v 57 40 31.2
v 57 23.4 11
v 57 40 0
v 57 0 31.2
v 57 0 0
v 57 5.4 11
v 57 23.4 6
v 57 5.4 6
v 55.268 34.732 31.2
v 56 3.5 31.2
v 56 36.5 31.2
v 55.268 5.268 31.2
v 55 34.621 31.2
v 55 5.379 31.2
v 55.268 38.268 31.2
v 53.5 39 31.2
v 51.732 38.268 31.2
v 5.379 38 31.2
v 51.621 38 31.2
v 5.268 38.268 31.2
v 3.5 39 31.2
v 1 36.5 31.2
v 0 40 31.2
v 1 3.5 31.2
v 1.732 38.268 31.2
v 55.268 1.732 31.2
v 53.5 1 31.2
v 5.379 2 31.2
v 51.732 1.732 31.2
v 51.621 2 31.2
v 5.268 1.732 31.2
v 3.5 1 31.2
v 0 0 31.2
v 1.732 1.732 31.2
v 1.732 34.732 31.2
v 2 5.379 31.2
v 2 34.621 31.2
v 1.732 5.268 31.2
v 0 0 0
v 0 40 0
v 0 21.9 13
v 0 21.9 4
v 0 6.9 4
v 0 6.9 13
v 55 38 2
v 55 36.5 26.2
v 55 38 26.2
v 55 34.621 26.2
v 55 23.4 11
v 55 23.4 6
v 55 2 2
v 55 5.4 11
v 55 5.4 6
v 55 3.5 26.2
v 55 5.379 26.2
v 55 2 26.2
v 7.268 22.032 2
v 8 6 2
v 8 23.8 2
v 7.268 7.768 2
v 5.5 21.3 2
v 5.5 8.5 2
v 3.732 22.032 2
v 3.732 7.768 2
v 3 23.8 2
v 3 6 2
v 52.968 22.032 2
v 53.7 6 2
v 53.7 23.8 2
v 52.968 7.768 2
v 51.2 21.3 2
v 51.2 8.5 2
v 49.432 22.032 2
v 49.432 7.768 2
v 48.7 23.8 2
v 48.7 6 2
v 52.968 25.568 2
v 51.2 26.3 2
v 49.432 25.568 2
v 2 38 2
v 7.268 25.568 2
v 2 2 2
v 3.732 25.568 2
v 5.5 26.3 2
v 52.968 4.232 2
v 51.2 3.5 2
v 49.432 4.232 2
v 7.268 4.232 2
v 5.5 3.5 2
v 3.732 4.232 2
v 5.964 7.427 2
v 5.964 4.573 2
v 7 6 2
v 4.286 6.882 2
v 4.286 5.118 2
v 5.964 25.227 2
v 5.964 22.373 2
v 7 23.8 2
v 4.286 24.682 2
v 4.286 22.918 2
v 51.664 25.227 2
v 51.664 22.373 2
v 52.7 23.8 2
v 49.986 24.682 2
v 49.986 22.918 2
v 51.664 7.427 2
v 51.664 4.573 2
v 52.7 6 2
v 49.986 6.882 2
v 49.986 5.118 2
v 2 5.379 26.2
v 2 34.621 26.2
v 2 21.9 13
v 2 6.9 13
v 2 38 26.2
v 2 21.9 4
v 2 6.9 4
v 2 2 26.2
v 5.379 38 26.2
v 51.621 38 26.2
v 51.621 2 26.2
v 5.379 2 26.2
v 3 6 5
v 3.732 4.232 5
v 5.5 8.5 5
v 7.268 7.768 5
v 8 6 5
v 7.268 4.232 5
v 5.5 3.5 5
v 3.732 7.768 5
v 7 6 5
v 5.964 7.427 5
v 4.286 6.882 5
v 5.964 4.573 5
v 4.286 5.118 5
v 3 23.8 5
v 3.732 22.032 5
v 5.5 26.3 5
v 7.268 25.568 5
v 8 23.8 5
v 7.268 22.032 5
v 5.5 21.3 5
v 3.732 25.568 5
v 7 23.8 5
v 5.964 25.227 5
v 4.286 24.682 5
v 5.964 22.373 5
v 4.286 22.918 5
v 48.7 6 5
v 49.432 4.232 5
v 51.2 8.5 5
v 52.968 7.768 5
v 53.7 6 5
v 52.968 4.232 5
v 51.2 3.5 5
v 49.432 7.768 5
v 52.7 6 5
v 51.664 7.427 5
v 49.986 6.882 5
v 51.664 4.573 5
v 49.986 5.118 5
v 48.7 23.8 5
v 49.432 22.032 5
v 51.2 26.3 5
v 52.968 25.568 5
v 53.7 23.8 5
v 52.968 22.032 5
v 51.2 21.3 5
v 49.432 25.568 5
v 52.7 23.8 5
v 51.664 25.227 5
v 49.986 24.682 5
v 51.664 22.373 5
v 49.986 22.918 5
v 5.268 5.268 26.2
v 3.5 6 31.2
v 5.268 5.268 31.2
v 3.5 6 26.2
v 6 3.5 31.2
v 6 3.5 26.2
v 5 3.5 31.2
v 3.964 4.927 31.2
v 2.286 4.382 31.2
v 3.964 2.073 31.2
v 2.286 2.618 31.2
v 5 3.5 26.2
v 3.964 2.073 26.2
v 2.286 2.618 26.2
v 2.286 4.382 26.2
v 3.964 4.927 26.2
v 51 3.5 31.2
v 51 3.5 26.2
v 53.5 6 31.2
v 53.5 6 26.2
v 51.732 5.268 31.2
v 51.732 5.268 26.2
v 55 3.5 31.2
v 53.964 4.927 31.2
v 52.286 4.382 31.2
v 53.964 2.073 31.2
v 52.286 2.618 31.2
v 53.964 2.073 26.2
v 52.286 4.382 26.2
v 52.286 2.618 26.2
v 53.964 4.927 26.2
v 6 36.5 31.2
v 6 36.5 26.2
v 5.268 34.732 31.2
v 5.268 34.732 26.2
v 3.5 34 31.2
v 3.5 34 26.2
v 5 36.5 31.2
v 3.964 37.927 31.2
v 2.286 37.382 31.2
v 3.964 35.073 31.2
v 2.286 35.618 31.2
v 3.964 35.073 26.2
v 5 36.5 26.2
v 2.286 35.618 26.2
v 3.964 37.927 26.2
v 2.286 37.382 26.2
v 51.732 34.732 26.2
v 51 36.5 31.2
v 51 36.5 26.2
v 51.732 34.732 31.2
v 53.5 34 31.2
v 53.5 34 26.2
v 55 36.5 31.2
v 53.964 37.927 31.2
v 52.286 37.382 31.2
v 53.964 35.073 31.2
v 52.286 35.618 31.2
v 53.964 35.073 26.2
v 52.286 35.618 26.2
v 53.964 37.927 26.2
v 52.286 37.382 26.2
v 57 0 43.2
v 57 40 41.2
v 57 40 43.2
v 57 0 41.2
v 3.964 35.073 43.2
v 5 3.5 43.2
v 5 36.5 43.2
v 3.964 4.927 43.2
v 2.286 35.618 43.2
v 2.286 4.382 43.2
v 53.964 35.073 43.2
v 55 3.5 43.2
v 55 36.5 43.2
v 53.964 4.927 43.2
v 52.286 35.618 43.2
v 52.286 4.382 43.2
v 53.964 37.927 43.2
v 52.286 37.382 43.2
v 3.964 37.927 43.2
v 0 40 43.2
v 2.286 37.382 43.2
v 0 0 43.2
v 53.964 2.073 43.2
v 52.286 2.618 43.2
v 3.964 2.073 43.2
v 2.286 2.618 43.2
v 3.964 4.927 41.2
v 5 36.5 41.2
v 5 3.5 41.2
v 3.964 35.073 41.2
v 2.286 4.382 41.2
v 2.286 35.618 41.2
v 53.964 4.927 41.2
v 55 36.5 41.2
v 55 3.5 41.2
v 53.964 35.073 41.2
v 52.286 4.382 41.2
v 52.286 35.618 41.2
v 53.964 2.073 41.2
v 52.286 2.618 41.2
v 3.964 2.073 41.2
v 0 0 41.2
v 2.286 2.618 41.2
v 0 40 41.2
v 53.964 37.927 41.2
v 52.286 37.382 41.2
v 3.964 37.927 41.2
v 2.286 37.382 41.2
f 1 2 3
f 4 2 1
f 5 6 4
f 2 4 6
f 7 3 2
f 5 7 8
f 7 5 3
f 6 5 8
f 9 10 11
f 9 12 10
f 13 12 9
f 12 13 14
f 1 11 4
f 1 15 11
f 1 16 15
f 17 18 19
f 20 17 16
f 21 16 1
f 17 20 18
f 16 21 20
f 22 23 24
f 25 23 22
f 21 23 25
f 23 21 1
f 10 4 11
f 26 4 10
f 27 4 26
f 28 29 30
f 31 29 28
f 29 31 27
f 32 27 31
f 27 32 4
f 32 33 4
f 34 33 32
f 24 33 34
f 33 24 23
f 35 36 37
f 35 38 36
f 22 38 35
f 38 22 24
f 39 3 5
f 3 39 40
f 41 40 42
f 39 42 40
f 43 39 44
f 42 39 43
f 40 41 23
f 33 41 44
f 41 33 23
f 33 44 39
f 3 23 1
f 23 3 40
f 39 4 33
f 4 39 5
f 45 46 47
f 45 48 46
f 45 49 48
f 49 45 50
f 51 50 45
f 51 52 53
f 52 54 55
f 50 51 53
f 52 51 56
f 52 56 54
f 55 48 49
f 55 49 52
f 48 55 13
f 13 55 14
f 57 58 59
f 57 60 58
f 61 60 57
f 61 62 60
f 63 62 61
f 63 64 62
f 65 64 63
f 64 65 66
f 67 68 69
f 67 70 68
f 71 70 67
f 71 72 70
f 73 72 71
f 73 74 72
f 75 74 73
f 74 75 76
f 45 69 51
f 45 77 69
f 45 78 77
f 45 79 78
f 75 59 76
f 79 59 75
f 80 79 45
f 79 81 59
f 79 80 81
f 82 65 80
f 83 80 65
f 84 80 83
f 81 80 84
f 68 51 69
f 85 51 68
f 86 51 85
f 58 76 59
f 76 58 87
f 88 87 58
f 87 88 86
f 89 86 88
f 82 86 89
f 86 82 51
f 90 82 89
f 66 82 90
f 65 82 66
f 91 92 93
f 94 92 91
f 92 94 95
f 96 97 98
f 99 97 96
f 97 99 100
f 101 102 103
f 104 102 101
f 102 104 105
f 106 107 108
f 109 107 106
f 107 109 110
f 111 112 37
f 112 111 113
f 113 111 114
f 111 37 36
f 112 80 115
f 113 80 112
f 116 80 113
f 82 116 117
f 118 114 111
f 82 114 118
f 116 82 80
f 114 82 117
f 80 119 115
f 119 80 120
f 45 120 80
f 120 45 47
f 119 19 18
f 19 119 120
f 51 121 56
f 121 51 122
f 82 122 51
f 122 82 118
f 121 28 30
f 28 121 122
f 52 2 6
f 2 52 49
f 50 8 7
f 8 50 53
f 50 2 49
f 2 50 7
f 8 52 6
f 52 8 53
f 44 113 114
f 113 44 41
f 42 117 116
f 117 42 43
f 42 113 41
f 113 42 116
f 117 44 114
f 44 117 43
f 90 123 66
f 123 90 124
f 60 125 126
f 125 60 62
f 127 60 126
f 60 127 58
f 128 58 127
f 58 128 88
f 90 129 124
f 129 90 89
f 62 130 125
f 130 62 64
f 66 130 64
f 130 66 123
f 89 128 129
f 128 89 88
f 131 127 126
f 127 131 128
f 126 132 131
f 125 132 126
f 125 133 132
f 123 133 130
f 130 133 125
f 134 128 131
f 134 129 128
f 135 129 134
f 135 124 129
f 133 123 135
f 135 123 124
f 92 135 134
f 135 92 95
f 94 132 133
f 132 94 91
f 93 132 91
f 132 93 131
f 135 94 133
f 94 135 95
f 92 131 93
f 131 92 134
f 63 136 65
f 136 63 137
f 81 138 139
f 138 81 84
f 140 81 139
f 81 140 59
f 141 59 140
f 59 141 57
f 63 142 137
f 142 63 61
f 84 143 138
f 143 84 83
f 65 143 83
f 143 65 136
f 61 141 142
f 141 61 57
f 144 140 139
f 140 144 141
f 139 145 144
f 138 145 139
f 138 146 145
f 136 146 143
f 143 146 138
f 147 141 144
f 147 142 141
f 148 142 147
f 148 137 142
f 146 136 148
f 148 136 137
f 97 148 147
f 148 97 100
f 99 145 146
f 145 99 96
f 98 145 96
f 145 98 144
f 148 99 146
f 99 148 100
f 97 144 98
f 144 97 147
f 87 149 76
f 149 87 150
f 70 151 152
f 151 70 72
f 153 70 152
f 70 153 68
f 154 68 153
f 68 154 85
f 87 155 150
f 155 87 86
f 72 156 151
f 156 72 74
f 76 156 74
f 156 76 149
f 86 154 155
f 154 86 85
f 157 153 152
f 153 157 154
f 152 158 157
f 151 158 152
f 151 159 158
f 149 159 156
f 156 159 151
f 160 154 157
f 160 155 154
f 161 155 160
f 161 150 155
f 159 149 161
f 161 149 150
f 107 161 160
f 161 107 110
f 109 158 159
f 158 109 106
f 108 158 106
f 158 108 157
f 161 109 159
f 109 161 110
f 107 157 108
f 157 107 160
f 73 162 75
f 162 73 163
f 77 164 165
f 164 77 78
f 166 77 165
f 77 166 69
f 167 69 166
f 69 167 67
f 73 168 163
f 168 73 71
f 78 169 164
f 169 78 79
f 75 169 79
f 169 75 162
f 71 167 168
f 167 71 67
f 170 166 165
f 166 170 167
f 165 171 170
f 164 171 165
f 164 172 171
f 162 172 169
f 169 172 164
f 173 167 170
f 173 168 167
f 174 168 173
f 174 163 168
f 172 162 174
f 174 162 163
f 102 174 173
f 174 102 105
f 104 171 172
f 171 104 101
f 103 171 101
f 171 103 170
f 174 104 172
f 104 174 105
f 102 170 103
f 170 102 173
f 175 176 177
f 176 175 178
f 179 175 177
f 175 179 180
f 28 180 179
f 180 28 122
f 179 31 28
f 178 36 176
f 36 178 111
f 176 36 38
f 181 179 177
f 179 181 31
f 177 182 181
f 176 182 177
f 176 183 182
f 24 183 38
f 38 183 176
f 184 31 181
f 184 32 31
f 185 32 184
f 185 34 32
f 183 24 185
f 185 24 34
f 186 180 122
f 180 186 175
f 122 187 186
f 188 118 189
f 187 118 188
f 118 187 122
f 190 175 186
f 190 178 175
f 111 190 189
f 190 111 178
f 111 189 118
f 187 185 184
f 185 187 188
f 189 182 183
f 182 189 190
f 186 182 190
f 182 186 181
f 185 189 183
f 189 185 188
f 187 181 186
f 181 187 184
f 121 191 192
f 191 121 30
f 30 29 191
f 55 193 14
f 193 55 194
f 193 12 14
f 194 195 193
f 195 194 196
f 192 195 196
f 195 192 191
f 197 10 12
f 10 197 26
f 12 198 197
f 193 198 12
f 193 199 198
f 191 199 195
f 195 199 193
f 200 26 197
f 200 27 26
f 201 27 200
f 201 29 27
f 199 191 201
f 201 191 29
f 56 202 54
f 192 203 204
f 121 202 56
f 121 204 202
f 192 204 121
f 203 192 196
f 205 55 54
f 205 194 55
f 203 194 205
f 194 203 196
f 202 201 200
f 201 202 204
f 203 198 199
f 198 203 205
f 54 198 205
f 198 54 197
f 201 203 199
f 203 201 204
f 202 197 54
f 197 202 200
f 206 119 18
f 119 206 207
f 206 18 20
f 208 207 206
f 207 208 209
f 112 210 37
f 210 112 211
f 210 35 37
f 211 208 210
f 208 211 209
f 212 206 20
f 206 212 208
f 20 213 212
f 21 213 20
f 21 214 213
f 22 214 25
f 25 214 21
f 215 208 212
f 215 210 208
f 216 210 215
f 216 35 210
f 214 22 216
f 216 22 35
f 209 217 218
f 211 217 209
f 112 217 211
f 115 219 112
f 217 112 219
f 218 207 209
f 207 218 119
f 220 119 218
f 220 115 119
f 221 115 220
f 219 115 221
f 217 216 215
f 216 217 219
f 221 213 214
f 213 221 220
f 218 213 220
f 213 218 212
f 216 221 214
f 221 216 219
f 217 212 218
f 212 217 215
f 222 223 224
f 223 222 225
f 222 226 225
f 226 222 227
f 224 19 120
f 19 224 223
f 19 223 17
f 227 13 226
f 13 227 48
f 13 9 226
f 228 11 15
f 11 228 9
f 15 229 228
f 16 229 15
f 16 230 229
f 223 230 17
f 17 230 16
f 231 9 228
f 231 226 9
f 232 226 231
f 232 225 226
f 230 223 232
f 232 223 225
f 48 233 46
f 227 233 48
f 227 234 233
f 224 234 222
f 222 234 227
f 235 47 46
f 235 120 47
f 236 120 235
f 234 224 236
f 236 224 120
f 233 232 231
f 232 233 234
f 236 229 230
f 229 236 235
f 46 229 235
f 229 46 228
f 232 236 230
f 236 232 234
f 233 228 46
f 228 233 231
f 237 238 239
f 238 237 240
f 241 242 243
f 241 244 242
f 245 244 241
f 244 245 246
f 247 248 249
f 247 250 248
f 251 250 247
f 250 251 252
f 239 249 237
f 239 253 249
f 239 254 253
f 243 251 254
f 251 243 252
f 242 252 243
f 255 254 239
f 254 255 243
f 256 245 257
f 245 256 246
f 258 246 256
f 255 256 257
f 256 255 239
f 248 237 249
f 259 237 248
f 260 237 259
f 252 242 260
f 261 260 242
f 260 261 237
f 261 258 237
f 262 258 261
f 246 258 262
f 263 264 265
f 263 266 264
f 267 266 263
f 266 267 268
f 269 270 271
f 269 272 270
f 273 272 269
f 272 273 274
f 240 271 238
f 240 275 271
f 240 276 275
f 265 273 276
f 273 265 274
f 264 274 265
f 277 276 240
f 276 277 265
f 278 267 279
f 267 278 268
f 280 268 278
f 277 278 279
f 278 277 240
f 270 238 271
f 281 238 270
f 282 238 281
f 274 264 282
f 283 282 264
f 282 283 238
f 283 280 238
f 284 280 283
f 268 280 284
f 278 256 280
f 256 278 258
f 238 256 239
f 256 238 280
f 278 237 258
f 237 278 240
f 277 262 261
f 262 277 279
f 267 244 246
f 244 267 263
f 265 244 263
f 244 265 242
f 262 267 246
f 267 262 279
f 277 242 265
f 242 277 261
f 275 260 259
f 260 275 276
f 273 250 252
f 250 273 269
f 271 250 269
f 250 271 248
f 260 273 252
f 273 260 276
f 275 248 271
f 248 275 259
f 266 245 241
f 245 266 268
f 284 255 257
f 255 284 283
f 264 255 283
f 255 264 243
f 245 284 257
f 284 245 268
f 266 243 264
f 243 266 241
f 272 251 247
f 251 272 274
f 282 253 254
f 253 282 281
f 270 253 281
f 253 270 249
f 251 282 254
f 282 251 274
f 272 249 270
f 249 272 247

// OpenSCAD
PM_LENGTH = 51;
PM_WIDTH = 22.8;
PM_HEIGHT = 12.2;

BATTERY_LENGTH = 50;
BATTERY_WIDTH = 34;
BATTERY_HEIGHT = 10;

BOLT_DIAMETER = 3;

WALL_THICKNESS = 2;
TOLERANCE = 1;
BUFFER = 3;
BOX_HEIGHT = PM_HEIGHT + BATTERY_HEIGHT + BUFFER + (WALL_THICKNESS*2) + (TOLERANCE*2);

difference(){
    // main box 
    cube([PM_LENGTH+(WALL_THICKNESS*2)+(TOLERANCE*2),
        BATTERY_WIDTH+(WALL_THICKNESS*2)+(TOLERANCE*2),
        BOX_HEIGHT
    ]);

    // opening for board
    translate([WALL_THICKNESS,WALL_THICKNESS,WALL_THICKNESS]){
        // Combined components outline
        cube([PM_LENGTH+(TOLERANCE*2),
            BATTERY_WIDTH+(TOLERANCE*2),
            BOX_HEIGHT
        ]);
    }
    
    /*
    // mounting bolt openings
    translate([6,6,0]){
        cylinder(r=2/2,h=PM_HEIGHT*2);
    }
    translate([6,PM_WIDTH+(WALL_THICKNESS*2)+(TOLERANCE*2)-5,0]){
        cylinder(r=2/2,h=PM_HEIGHT*2);
    }
    translate([(PM_LENGTH+(WALL_THICKNESS*2)+(TOLERANCE*2))-5,6,0]){
        cylinder(r=2/2,h=PM_HEIGHT*2);
    }
    translate([(PM_LENGTH+(WALL_THICKNESS*2)+(TOLERANCE*2))-5,PM_WIDTH+(WALL_THICKNESS*2)+(TOLERANCE*2)-5,0]){
        cylinder(r=2/2,h=PM_HEIGHT*2);
    }
    */
    
    // opening for wires
    translate([(PM_LENGTH+(WALL_THICKNESS*2)+(TOLERANCE*2))-(WALL_THICKNESS*2),(PM_WIDTH+(WALL_THICKNESS*2)+(TOLERANCE*2))/2-(18/2),6]){
        cube([WALL_THICKNESS*3, 18,5]);
    }
    
    // opening for USB-C
    translate([-1,(PM_WIDTH+(WALL_THICKNESS*2)+(TOLERANCE*2))/2-(15/2),4]){
        cube([WALL_THICKNESS*3, 15,9]);
    }
    
    /*
    // DEBUG: slice it in half 
    translate([-1,-1,16]){
    //translate([-1,-1,-1]){
        cube([PM_LENGTH+(WALL_THICKNESS*2)+(TOLERANCE*2)+2,PM_WIDTH+(WALL_THICKNESS*2)+(TOLERANCE*2)+2,PM_HEIGHT+(WALL_THICKNESS*2)+(TOLERANCE*2)]); 
        //cube([PM_LENGTH+(WALL_THICKNESS*2)+(TOLERANCE*2)+2,PM_WIDTH+(WALL_THICKNESS*2)+(TOLERANCE*2)+2,14]); 
    }
    */
}

// board mounting posts
translate([5.5,6,0]){
    difference(){
        cylinder(r=5/2,h=5);
        cylinder(r=1.5,h=6);
    }
}
translate([5.5,PM_WIDTH+(WALL_THICKNESS*2)+(TOLERANCE*2)-5,0]){
    difference(){
        cylinder(r=5/2,h=5);
        cylinder(r=1.5,h=6);
    }
}
translate([PM_LENGTH+0.2,6,0]){
    difference(){
        cylinder(r=5/2,h=5);
        cylinder(r=1.5,h=6);
    }
}
translate([PM_LENGTH+0.2,PM_WIDTH+(WALL_THICKNESS*2)+(TOLERANCE*2)-5,0]){
    difference(){
        cylinder(r=5/2,h=5);
        cylinder(r=1.5,h=6);
    }
}

// Cover mounting posts
translate([WALL_THICKNESS+1.5,WALL_THICKNESS+1.5,BOX_HEIGHT-5]){
    difference(){
        cylinder(r=5/2,h=5);
        cylinder(r=1.5,h=6);
    }
}
translate([PM_LENGTH+WALL_THICKNESS+0.5,WALL_THICKNESS+1.5,BOX_HEIGHT-5]){
    difference(){
        cylinder(r=5/2,h=5);
        cylinder(r=1.5,h=6);
    }
}
translate([WALL_THICKNESS+1.5,BATTERY_WIDTH+WALL_THICKNESS+WALL_THICKNESS-1.5,BOX_HEIGHT-5]){
    difference(){
        cylinder(r=5/2,h=5);
        cylinder(r=1.5,h=6);
    }
}
translate([PM_LENGTH+WALL_THICKNESS+0.5,BATTERY_WIDTH+WALL_THICKNESS+0.5,BOX_HEIGHT-5]){
    difference(){
        cylinder(r=5/2,h=5);
        cylinder(r=1.5,h=6);
    }
}


// cover
translate([0,0,BOX_HEIGHT+10]){
    difference(){
        cube([PM_LENGTH+(WALL_THICKNESS*2)+(TOLERANCE*2),
            BATTERY_WIDTH+(WALL_THICKNESS*2)+(TOLERANCE*2),
            WALL_THICKNESS
        ]);        
        translate([WALL_THICKNESS+1.5,WALL_THICKNESS+1.5,0]){
            cylinder(r=1.5,h=6);
        }
        translate([PM_LENGTH+WALL_THICKNESS+0.5,WALL_THICKNESS+1.5,0]){
            cylinder(r=1.5,h=6);
        }
        translate([WALL_THICKNESS+1.5,BATTERY_WIDTH+WALL_THICKNESS+WALL_THICKNESS-1.5,0]){
            cylinder(r=1.5,h=6);
        }
        translate([PM_LENGTH+WALL_THICKNESS+0.5,BATTERY_WIDTH+WALL_THICKNESS+0.5,0]){
            cylinder(r=1.5,h=6);
        }
    }
}
/*
// PM RP2040
translate([WALL_THICKNESS+TOLERANCE,WALL_THICKNESS+TOLERANCE+0.5,5]){
    color("blue"){
        import("5768 Feather RP2040 PropMaker.stl");
    }
}

// battery
translate([WALL_THICKNESS+TOLERANCE,
    WALL_THICKNESS+TOLERANCE,
    PM_HEIGHT + BUFFER]
){
    color("orange"){
        cube([50,34,10]);
    }
}
*/
